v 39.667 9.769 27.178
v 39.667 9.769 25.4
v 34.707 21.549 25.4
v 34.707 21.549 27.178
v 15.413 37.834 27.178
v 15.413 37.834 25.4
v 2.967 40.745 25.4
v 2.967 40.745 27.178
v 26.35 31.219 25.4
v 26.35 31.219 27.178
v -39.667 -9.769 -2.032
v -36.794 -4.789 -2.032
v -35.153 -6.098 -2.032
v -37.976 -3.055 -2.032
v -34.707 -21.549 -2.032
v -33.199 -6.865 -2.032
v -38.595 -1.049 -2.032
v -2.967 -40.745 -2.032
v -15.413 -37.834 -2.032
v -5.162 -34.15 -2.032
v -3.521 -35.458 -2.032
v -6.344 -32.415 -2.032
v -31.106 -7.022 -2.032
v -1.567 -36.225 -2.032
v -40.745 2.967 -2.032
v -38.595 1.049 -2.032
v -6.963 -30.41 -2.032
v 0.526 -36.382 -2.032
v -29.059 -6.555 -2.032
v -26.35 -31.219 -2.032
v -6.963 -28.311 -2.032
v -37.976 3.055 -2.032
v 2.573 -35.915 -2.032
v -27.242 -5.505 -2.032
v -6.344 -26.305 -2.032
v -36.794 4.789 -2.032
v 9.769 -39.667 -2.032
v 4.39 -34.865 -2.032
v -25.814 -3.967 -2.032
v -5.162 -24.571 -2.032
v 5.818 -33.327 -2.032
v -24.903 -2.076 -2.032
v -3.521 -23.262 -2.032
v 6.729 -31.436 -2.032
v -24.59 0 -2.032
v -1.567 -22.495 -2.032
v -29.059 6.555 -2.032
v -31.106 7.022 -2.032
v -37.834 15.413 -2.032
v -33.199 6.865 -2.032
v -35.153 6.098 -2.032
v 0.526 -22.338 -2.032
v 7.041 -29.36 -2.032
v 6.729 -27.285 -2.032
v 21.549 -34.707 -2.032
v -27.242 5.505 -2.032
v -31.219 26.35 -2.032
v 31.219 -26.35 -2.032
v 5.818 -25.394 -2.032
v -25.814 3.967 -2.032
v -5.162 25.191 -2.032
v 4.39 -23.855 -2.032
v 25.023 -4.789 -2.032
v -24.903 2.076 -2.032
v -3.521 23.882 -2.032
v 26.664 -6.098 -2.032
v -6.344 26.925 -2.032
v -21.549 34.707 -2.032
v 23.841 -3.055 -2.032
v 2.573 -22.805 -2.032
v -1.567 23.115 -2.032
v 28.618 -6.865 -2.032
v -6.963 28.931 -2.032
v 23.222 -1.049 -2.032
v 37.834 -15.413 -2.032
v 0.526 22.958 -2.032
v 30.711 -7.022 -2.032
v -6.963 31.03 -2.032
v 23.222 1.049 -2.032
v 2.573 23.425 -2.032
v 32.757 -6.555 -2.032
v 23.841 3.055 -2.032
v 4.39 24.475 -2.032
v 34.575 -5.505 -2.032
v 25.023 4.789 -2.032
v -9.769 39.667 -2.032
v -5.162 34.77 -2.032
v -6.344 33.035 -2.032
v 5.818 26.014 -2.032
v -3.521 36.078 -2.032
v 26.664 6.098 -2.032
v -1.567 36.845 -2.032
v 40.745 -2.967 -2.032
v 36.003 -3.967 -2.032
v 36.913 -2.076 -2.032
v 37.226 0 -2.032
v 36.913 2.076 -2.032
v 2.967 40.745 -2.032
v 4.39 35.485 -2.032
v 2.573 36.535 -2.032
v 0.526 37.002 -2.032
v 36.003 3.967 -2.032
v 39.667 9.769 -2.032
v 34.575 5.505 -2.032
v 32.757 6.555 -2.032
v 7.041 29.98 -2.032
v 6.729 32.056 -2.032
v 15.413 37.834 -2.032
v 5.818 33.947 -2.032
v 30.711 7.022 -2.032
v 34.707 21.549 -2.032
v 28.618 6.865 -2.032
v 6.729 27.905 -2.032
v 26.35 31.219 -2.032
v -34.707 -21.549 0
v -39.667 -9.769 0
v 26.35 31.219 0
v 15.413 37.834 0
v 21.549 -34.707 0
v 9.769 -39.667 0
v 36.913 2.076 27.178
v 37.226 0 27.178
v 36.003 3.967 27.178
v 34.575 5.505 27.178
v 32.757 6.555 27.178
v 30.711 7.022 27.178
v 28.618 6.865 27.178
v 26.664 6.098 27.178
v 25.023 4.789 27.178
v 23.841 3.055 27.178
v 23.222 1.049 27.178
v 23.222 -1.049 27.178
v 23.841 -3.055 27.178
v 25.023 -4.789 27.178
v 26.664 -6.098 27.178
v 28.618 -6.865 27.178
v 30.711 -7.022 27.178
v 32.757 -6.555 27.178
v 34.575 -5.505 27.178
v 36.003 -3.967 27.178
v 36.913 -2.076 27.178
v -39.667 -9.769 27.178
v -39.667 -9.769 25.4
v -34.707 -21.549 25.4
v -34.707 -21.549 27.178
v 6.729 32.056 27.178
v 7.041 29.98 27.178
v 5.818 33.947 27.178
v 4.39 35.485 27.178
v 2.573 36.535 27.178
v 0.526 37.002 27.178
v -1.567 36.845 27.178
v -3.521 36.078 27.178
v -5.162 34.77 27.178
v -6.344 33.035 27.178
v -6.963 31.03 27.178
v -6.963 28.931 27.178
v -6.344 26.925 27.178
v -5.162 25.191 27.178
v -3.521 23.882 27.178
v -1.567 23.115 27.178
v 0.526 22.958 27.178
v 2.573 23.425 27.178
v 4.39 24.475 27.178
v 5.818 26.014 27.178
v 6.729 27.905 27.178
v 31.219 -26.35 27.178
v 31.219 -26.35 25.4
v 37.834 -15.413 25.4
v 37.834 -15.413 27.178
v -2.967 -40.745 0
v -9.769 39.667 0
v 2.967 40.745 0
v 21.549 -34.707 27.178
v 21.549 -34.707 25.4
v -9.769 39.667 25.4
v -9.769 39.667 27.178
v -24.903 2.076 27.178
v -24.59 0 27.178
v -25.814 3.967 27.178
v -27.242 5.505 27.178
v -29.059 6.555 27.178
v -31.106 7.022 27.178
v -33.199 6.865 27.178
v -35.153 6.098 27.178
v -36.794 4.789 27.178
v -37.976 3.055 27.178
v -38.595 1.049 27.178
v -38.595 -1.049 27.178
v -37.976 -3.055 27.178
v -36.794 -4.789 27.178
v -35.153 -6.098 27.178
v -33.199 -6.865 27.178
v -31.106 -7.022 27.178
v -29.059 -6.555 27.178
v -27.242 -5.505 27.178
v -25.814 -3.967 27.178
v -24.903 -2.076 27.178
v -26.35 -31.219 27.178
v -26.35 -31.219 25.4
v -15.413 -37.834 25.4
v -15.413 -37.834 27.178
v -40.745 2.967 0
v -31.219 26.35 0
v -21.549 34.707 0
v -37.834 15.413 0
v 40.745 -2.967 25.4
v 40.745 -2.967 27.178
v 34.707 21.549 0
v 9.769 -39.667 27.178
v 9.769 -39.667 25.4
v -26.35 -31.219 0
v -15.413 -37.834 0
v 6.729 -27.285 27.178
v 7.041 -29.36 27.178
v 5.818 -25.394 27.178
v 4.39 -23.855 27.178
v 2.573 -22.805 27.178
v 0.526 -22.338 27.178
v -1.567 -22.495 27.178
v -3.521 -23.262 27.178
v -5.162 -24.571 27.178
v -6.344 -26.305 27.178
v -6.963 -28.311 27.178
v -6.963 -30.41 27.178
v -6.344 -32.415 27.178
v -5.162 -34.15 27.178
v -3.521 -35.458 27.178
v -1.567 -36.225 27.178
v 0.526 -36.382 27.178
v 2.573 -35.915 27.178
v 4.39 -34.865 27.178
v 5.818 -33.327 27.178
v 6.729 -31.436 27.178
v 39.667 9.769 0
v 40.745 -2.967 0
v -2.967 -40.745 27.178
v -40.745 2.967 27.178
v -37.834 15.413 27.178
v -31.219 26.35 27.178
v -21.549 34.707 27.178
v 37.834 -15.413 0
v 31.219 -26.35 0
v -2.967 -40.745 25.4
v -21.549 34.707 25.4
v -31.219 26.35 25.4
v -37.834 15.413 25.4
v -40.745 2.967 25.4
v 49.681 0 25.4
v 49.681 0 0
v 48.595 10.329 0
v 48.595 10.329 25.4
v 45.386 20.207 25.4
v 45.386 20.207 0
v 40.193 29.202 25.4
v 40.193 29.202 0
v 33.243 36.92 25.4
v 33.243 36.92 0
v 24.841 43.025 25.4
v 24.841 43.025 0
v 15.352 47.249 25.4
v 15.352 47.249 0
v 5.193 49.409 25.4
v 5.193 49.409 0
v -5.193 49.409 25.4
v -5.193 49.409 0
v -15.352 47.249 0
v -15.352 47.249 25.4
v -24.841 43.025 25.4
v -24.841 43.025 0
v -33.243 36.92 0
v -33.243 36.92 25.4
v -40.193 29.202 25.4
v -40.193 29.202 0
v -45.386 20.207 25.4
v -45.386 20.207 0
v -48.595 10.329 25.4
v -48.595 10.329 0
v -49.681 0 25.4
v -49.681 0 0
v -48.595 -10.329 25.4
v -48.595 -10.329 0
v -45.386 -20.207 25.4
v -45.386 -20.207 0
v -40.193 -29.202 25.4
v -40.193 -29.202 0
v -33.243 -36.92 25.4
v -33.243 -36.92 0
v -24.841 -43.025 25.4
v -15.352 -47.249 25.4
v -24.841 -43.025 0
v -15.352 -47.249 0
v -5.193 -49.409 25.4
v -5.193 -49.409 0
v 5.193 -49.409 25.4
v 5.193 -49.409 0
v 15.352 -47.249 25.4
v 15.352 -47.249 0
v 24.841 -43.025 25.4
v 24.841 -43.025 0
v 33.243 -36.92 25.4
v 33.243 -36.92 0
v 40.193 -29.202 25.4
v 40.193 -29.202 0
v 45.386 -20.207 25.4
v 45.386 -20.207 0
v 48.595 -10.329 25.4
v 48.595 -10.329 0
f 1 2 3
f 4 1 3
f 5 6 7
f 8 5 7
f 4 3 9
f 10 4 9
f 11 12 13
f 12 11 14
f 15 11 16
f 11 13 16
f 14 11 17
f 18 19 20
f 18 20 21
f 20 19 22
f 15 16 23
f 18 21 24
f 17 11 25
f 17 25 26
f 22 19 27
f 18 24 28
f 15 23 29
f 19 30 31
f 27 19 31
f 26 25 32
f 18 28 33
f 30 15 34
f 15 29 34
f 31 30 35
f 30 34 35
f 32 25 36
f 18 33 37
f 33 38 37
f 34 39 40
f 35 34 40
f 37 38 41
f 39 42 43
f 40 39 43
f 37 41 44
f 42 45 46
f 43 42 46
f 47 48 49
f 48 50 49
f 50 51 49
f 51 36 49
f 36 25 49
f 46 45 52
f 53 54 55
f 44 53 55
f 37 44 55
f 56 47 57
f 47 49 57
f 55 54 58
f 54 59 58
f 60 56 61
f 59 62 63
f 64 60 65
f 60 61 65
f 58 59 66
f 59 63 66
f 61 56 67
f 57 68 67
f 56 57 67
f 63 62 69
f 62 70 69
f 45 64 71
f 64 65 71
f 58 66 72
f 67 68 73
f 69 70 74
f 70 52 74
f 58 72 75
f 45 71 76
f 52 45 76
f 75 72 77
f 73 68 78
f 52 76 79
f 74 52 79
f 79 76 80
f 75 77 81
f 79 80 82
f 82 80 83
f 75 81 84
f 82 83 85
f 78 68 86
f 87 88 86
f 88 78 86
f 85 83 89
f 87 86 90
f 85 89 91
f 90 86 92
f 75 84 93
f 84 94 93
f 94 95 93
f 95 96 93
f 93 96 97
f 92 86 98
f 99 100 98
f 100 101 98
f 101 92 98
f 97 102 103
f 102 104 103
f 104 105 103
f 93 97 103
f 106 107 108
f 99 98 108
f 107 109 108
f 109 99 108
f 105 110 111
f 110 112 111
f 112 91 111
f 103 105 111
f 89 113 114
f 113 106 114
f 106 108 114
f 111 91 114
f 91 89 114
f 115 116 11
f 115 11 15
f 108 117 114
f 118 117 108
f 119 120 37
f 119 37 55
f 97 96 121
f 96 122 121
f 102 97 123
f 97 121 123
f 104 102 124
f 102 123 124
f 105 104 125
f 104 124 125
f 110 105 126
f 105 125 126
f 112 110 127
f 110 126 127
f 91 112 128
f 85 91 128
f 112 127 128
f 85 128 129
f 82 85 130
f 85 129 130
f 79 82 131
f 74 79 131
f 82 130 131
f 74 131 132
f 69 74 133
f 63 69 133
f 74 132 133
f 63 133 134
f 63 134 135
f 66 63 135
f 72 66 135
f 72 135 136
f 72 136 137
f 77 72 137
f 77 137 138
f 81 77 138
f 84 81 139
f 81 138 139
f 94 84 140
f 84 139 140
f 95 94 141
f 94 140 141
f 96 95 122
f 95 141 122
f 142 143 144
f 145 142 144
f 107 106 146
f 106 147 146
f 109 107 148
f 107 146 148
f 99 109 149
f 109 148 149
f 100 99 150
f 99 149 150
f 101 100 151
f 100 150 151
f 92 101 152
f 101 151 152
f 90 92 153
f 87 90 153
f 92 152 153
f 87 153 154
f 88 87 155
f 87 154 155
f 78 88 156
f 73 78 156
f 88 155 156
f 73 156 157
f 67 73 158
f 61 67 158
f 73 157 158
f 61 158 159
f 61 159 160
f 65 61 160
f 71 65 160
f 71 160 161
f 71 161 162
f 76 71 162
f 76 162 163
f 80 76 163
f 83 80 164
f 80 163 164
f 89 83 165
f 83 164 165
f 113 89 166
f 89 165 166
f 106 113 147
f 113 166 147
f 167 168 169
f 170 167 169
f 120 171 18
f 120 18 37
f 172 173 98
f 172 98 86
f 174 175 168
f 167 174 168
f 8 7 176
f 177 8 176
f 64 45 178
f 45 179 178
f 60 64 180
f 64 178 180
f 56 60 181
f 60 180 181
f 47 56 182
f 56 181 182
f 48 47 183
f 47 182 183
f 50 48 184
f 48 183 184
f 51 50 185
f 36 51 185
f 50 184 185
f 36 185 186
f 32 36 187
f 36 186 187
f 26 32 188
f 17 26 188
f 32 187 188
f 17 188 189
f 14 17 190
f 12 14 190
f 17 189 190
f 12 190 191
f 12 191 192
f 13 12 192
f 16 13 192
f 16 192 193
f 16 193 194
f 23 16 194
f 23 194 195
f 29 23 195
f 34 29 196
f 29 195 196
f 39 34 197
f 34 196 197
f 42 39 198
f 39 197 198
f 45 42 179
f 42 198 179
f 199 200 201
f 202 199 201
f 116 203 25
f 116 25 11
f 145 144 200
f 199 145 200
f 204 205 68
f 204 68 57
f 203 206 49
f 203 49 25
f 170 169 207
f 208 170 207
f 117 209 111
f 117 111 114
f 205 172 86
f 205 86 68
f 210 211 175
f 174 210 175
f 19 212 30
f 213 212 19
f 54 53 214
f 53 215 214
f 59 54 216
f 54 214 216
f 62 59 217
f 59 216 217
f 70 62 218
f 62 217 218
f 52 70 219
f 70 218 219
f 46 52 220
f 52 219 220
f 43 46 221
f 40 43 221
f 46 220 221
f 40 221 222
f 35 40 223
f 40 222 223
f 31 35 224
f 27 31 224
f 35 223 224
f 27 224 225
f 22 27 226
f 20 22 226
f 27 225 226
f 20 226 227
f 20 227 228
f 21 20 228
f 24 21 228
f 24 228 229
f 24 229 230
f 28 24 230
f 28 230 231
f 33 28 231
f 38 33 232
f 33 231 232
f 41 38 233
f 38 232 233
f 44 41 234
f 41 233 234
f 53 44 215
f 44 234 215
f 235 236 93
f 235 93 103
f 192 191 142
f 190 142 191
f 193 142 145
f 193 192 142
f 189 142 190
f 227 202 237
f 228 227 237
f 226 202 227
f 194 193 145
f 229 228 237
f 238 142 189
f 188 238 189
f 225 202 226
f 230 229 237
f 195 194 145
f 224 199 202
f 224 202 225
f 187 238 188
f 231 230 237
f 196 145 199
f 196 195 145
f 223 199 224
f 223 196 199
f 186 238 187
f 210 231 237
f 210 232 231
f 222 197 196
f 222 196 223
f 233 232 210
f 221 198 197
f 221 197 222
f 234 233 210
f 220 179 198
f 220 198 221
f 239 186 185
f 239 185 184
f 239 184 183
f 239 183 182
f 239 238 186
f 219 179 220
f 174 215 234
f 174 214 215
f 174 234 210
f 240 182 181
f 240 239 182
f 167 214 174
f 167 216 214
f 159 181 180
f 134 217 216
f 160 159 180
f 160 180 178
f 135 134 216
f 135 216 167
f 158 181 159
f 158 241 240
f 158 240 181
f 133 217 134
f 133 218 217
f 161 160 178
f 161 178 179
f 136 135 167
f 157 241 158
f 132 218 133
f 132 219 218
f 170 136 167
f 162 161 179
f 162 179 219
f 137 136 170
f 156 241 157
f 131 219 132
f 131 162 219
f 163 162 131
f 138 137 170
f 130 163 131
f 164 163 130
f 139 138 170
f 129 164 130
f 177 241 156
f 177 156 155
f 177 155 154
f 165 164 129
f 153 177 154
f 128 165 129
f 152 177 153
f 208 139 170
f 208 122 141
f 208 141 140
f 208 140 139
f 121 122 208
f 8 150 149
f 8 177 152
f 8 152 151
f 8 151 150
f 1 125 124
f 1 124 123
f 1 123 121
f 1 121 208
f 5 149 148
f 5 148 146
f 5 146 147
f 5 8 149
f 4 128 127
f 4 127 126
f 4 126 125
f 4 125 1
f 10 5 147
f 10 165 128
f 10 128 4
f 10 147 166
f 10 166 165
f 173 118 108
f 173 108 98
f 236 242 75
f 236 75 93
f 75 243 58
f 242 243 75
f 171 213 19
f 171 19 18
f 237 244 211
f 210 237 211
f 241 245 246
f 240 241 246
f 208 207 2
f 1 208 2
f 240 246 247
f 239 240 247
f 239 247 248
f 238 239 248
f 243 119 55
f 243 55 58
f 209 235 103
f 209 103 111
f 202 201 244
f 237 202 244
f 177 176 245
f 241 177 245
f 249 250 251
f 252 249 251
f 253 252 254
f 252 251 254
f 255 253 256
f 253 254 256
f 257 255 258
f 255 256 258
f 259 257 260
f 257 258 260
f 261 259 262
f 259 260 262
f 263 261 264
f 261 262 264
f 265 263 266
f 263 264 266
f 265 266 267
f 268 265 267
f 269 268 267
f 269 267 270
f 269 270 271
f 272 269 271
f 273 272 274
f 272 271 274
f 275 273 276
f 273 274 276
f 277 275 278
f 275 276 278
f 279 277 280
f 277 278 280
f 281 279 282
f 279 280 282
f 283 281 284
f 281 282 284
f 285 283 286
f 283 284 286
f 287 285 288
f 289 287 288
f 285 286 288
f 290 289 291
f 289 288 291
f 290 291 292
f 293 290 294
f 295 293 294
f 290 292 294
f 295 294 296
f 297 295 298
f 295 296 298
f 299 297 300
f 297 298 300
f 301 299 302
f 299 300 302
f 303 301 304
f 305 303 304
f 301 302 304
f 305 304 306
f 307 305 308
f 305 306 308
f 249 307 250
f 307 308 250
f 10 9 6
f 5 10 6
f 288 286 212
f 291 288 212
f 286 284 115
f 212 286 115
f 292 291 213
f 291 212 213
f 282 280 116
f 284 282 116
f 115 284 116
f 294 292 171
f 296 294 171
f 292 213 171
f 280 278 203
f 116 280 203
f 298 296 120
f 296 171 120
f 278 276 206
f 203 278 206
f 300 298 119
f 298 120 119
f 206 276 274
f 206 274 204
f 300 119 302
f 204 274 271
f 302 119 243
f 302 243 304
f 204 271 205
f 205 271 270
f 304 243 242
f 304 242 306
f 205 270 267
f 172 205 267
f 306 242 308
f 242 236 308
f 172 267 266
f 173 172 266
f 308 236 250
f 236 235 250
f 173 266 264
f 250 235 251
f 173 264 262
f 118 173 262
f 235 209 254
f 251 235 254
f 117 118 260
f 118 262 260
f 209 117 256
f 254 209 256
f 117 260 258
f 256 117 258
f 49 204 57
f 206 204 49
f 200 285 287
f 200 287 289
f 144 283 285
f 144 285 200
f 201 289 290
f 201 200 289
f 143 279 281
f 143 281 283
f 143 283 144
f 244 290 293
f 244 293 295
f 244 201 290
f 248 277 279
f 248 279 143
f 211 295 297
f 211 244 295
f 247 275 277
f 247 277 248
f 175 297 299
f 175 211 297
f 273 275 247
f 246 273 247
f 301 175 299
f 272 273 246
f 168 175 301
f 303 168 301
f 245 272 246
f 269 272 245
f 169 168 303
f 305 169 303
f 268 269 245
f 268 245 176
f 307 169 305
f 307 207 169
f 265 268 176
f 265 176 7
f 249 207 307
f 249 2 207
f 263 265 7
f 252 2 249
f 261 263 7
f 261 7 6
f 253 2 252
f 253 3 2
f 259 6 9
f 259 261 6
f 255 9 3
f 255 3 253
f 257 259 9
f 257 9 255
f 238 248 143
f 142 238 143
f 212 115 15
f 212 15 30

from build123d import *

# Parameters (mm, degrees)
F1_R          = 49.681019
F3_DEPTH      = 25.4
F4_DEPTH      = 27.178
F4_DEPTH_BACK = 2.032
F0_R          = 7.041454
F5_DEPTH      = 75.184
F5_DEPTH_BACK = 119.126


with BuildPart() as f3:
    # F1 (on Top) → F3 (new body)
    with BuildSketch(Plane.XY):
        Circle(F1_R)
    extrude(amount=F3_DEPTH)

    # F2 (on Top) → F4 (join, two sides)
    with BuildSketch(Plane.XY) as f4_sk:
        Polygon((-31.21903, 26.349589), (-37.833532, 15.412737), (-40.744625, 2.96718), (-39.66735, -9.768826), (-34.707159, -21.548591), (-26.349589, -31.21903), (-15.412737, -37.833532), (-2.96718, -40.744625), (9.768826, -39.66735), (21.548591, -34.707159), (31.21903, -26.349589), (37.833532, -15.412737), (40.744625, -2.96718), (39.66735, 9.768826), (34.707159, 21.548591), (26.349589, 31.21903), (15.412737, 37.833532), (2.96718, 40.744625), (-9.768826, 39.66735), (-21.548591, 34.707159), align=None)
    extrude(amount=F4_DEPTH)
    extrude(f4_sk.sketch, amount=-F4_DEPTH_BACK)

    # F0 (on Top) → F5 (cut, two sides)
    with BuildSketch(Plane.XY) as f5_sk:
        with Locations((0, 29.98014)):
            Circle(F0_R)
        with Locations((30.184653, 0)):
            Circle(F0_R)
        with Locations((0, -29.360153)):
            Circle(F0_R)
        with Locations((-31.631861, 0)):
            Circle(F0_R)
    extrude(amount=F5_DEPTH, mode=Mode.SUBTRACT)
    extrude(f5_sk.sketch, amount=-F5_DEPTH_BACK, mode=Mode.SUBTRACT)


solid = f3.part
